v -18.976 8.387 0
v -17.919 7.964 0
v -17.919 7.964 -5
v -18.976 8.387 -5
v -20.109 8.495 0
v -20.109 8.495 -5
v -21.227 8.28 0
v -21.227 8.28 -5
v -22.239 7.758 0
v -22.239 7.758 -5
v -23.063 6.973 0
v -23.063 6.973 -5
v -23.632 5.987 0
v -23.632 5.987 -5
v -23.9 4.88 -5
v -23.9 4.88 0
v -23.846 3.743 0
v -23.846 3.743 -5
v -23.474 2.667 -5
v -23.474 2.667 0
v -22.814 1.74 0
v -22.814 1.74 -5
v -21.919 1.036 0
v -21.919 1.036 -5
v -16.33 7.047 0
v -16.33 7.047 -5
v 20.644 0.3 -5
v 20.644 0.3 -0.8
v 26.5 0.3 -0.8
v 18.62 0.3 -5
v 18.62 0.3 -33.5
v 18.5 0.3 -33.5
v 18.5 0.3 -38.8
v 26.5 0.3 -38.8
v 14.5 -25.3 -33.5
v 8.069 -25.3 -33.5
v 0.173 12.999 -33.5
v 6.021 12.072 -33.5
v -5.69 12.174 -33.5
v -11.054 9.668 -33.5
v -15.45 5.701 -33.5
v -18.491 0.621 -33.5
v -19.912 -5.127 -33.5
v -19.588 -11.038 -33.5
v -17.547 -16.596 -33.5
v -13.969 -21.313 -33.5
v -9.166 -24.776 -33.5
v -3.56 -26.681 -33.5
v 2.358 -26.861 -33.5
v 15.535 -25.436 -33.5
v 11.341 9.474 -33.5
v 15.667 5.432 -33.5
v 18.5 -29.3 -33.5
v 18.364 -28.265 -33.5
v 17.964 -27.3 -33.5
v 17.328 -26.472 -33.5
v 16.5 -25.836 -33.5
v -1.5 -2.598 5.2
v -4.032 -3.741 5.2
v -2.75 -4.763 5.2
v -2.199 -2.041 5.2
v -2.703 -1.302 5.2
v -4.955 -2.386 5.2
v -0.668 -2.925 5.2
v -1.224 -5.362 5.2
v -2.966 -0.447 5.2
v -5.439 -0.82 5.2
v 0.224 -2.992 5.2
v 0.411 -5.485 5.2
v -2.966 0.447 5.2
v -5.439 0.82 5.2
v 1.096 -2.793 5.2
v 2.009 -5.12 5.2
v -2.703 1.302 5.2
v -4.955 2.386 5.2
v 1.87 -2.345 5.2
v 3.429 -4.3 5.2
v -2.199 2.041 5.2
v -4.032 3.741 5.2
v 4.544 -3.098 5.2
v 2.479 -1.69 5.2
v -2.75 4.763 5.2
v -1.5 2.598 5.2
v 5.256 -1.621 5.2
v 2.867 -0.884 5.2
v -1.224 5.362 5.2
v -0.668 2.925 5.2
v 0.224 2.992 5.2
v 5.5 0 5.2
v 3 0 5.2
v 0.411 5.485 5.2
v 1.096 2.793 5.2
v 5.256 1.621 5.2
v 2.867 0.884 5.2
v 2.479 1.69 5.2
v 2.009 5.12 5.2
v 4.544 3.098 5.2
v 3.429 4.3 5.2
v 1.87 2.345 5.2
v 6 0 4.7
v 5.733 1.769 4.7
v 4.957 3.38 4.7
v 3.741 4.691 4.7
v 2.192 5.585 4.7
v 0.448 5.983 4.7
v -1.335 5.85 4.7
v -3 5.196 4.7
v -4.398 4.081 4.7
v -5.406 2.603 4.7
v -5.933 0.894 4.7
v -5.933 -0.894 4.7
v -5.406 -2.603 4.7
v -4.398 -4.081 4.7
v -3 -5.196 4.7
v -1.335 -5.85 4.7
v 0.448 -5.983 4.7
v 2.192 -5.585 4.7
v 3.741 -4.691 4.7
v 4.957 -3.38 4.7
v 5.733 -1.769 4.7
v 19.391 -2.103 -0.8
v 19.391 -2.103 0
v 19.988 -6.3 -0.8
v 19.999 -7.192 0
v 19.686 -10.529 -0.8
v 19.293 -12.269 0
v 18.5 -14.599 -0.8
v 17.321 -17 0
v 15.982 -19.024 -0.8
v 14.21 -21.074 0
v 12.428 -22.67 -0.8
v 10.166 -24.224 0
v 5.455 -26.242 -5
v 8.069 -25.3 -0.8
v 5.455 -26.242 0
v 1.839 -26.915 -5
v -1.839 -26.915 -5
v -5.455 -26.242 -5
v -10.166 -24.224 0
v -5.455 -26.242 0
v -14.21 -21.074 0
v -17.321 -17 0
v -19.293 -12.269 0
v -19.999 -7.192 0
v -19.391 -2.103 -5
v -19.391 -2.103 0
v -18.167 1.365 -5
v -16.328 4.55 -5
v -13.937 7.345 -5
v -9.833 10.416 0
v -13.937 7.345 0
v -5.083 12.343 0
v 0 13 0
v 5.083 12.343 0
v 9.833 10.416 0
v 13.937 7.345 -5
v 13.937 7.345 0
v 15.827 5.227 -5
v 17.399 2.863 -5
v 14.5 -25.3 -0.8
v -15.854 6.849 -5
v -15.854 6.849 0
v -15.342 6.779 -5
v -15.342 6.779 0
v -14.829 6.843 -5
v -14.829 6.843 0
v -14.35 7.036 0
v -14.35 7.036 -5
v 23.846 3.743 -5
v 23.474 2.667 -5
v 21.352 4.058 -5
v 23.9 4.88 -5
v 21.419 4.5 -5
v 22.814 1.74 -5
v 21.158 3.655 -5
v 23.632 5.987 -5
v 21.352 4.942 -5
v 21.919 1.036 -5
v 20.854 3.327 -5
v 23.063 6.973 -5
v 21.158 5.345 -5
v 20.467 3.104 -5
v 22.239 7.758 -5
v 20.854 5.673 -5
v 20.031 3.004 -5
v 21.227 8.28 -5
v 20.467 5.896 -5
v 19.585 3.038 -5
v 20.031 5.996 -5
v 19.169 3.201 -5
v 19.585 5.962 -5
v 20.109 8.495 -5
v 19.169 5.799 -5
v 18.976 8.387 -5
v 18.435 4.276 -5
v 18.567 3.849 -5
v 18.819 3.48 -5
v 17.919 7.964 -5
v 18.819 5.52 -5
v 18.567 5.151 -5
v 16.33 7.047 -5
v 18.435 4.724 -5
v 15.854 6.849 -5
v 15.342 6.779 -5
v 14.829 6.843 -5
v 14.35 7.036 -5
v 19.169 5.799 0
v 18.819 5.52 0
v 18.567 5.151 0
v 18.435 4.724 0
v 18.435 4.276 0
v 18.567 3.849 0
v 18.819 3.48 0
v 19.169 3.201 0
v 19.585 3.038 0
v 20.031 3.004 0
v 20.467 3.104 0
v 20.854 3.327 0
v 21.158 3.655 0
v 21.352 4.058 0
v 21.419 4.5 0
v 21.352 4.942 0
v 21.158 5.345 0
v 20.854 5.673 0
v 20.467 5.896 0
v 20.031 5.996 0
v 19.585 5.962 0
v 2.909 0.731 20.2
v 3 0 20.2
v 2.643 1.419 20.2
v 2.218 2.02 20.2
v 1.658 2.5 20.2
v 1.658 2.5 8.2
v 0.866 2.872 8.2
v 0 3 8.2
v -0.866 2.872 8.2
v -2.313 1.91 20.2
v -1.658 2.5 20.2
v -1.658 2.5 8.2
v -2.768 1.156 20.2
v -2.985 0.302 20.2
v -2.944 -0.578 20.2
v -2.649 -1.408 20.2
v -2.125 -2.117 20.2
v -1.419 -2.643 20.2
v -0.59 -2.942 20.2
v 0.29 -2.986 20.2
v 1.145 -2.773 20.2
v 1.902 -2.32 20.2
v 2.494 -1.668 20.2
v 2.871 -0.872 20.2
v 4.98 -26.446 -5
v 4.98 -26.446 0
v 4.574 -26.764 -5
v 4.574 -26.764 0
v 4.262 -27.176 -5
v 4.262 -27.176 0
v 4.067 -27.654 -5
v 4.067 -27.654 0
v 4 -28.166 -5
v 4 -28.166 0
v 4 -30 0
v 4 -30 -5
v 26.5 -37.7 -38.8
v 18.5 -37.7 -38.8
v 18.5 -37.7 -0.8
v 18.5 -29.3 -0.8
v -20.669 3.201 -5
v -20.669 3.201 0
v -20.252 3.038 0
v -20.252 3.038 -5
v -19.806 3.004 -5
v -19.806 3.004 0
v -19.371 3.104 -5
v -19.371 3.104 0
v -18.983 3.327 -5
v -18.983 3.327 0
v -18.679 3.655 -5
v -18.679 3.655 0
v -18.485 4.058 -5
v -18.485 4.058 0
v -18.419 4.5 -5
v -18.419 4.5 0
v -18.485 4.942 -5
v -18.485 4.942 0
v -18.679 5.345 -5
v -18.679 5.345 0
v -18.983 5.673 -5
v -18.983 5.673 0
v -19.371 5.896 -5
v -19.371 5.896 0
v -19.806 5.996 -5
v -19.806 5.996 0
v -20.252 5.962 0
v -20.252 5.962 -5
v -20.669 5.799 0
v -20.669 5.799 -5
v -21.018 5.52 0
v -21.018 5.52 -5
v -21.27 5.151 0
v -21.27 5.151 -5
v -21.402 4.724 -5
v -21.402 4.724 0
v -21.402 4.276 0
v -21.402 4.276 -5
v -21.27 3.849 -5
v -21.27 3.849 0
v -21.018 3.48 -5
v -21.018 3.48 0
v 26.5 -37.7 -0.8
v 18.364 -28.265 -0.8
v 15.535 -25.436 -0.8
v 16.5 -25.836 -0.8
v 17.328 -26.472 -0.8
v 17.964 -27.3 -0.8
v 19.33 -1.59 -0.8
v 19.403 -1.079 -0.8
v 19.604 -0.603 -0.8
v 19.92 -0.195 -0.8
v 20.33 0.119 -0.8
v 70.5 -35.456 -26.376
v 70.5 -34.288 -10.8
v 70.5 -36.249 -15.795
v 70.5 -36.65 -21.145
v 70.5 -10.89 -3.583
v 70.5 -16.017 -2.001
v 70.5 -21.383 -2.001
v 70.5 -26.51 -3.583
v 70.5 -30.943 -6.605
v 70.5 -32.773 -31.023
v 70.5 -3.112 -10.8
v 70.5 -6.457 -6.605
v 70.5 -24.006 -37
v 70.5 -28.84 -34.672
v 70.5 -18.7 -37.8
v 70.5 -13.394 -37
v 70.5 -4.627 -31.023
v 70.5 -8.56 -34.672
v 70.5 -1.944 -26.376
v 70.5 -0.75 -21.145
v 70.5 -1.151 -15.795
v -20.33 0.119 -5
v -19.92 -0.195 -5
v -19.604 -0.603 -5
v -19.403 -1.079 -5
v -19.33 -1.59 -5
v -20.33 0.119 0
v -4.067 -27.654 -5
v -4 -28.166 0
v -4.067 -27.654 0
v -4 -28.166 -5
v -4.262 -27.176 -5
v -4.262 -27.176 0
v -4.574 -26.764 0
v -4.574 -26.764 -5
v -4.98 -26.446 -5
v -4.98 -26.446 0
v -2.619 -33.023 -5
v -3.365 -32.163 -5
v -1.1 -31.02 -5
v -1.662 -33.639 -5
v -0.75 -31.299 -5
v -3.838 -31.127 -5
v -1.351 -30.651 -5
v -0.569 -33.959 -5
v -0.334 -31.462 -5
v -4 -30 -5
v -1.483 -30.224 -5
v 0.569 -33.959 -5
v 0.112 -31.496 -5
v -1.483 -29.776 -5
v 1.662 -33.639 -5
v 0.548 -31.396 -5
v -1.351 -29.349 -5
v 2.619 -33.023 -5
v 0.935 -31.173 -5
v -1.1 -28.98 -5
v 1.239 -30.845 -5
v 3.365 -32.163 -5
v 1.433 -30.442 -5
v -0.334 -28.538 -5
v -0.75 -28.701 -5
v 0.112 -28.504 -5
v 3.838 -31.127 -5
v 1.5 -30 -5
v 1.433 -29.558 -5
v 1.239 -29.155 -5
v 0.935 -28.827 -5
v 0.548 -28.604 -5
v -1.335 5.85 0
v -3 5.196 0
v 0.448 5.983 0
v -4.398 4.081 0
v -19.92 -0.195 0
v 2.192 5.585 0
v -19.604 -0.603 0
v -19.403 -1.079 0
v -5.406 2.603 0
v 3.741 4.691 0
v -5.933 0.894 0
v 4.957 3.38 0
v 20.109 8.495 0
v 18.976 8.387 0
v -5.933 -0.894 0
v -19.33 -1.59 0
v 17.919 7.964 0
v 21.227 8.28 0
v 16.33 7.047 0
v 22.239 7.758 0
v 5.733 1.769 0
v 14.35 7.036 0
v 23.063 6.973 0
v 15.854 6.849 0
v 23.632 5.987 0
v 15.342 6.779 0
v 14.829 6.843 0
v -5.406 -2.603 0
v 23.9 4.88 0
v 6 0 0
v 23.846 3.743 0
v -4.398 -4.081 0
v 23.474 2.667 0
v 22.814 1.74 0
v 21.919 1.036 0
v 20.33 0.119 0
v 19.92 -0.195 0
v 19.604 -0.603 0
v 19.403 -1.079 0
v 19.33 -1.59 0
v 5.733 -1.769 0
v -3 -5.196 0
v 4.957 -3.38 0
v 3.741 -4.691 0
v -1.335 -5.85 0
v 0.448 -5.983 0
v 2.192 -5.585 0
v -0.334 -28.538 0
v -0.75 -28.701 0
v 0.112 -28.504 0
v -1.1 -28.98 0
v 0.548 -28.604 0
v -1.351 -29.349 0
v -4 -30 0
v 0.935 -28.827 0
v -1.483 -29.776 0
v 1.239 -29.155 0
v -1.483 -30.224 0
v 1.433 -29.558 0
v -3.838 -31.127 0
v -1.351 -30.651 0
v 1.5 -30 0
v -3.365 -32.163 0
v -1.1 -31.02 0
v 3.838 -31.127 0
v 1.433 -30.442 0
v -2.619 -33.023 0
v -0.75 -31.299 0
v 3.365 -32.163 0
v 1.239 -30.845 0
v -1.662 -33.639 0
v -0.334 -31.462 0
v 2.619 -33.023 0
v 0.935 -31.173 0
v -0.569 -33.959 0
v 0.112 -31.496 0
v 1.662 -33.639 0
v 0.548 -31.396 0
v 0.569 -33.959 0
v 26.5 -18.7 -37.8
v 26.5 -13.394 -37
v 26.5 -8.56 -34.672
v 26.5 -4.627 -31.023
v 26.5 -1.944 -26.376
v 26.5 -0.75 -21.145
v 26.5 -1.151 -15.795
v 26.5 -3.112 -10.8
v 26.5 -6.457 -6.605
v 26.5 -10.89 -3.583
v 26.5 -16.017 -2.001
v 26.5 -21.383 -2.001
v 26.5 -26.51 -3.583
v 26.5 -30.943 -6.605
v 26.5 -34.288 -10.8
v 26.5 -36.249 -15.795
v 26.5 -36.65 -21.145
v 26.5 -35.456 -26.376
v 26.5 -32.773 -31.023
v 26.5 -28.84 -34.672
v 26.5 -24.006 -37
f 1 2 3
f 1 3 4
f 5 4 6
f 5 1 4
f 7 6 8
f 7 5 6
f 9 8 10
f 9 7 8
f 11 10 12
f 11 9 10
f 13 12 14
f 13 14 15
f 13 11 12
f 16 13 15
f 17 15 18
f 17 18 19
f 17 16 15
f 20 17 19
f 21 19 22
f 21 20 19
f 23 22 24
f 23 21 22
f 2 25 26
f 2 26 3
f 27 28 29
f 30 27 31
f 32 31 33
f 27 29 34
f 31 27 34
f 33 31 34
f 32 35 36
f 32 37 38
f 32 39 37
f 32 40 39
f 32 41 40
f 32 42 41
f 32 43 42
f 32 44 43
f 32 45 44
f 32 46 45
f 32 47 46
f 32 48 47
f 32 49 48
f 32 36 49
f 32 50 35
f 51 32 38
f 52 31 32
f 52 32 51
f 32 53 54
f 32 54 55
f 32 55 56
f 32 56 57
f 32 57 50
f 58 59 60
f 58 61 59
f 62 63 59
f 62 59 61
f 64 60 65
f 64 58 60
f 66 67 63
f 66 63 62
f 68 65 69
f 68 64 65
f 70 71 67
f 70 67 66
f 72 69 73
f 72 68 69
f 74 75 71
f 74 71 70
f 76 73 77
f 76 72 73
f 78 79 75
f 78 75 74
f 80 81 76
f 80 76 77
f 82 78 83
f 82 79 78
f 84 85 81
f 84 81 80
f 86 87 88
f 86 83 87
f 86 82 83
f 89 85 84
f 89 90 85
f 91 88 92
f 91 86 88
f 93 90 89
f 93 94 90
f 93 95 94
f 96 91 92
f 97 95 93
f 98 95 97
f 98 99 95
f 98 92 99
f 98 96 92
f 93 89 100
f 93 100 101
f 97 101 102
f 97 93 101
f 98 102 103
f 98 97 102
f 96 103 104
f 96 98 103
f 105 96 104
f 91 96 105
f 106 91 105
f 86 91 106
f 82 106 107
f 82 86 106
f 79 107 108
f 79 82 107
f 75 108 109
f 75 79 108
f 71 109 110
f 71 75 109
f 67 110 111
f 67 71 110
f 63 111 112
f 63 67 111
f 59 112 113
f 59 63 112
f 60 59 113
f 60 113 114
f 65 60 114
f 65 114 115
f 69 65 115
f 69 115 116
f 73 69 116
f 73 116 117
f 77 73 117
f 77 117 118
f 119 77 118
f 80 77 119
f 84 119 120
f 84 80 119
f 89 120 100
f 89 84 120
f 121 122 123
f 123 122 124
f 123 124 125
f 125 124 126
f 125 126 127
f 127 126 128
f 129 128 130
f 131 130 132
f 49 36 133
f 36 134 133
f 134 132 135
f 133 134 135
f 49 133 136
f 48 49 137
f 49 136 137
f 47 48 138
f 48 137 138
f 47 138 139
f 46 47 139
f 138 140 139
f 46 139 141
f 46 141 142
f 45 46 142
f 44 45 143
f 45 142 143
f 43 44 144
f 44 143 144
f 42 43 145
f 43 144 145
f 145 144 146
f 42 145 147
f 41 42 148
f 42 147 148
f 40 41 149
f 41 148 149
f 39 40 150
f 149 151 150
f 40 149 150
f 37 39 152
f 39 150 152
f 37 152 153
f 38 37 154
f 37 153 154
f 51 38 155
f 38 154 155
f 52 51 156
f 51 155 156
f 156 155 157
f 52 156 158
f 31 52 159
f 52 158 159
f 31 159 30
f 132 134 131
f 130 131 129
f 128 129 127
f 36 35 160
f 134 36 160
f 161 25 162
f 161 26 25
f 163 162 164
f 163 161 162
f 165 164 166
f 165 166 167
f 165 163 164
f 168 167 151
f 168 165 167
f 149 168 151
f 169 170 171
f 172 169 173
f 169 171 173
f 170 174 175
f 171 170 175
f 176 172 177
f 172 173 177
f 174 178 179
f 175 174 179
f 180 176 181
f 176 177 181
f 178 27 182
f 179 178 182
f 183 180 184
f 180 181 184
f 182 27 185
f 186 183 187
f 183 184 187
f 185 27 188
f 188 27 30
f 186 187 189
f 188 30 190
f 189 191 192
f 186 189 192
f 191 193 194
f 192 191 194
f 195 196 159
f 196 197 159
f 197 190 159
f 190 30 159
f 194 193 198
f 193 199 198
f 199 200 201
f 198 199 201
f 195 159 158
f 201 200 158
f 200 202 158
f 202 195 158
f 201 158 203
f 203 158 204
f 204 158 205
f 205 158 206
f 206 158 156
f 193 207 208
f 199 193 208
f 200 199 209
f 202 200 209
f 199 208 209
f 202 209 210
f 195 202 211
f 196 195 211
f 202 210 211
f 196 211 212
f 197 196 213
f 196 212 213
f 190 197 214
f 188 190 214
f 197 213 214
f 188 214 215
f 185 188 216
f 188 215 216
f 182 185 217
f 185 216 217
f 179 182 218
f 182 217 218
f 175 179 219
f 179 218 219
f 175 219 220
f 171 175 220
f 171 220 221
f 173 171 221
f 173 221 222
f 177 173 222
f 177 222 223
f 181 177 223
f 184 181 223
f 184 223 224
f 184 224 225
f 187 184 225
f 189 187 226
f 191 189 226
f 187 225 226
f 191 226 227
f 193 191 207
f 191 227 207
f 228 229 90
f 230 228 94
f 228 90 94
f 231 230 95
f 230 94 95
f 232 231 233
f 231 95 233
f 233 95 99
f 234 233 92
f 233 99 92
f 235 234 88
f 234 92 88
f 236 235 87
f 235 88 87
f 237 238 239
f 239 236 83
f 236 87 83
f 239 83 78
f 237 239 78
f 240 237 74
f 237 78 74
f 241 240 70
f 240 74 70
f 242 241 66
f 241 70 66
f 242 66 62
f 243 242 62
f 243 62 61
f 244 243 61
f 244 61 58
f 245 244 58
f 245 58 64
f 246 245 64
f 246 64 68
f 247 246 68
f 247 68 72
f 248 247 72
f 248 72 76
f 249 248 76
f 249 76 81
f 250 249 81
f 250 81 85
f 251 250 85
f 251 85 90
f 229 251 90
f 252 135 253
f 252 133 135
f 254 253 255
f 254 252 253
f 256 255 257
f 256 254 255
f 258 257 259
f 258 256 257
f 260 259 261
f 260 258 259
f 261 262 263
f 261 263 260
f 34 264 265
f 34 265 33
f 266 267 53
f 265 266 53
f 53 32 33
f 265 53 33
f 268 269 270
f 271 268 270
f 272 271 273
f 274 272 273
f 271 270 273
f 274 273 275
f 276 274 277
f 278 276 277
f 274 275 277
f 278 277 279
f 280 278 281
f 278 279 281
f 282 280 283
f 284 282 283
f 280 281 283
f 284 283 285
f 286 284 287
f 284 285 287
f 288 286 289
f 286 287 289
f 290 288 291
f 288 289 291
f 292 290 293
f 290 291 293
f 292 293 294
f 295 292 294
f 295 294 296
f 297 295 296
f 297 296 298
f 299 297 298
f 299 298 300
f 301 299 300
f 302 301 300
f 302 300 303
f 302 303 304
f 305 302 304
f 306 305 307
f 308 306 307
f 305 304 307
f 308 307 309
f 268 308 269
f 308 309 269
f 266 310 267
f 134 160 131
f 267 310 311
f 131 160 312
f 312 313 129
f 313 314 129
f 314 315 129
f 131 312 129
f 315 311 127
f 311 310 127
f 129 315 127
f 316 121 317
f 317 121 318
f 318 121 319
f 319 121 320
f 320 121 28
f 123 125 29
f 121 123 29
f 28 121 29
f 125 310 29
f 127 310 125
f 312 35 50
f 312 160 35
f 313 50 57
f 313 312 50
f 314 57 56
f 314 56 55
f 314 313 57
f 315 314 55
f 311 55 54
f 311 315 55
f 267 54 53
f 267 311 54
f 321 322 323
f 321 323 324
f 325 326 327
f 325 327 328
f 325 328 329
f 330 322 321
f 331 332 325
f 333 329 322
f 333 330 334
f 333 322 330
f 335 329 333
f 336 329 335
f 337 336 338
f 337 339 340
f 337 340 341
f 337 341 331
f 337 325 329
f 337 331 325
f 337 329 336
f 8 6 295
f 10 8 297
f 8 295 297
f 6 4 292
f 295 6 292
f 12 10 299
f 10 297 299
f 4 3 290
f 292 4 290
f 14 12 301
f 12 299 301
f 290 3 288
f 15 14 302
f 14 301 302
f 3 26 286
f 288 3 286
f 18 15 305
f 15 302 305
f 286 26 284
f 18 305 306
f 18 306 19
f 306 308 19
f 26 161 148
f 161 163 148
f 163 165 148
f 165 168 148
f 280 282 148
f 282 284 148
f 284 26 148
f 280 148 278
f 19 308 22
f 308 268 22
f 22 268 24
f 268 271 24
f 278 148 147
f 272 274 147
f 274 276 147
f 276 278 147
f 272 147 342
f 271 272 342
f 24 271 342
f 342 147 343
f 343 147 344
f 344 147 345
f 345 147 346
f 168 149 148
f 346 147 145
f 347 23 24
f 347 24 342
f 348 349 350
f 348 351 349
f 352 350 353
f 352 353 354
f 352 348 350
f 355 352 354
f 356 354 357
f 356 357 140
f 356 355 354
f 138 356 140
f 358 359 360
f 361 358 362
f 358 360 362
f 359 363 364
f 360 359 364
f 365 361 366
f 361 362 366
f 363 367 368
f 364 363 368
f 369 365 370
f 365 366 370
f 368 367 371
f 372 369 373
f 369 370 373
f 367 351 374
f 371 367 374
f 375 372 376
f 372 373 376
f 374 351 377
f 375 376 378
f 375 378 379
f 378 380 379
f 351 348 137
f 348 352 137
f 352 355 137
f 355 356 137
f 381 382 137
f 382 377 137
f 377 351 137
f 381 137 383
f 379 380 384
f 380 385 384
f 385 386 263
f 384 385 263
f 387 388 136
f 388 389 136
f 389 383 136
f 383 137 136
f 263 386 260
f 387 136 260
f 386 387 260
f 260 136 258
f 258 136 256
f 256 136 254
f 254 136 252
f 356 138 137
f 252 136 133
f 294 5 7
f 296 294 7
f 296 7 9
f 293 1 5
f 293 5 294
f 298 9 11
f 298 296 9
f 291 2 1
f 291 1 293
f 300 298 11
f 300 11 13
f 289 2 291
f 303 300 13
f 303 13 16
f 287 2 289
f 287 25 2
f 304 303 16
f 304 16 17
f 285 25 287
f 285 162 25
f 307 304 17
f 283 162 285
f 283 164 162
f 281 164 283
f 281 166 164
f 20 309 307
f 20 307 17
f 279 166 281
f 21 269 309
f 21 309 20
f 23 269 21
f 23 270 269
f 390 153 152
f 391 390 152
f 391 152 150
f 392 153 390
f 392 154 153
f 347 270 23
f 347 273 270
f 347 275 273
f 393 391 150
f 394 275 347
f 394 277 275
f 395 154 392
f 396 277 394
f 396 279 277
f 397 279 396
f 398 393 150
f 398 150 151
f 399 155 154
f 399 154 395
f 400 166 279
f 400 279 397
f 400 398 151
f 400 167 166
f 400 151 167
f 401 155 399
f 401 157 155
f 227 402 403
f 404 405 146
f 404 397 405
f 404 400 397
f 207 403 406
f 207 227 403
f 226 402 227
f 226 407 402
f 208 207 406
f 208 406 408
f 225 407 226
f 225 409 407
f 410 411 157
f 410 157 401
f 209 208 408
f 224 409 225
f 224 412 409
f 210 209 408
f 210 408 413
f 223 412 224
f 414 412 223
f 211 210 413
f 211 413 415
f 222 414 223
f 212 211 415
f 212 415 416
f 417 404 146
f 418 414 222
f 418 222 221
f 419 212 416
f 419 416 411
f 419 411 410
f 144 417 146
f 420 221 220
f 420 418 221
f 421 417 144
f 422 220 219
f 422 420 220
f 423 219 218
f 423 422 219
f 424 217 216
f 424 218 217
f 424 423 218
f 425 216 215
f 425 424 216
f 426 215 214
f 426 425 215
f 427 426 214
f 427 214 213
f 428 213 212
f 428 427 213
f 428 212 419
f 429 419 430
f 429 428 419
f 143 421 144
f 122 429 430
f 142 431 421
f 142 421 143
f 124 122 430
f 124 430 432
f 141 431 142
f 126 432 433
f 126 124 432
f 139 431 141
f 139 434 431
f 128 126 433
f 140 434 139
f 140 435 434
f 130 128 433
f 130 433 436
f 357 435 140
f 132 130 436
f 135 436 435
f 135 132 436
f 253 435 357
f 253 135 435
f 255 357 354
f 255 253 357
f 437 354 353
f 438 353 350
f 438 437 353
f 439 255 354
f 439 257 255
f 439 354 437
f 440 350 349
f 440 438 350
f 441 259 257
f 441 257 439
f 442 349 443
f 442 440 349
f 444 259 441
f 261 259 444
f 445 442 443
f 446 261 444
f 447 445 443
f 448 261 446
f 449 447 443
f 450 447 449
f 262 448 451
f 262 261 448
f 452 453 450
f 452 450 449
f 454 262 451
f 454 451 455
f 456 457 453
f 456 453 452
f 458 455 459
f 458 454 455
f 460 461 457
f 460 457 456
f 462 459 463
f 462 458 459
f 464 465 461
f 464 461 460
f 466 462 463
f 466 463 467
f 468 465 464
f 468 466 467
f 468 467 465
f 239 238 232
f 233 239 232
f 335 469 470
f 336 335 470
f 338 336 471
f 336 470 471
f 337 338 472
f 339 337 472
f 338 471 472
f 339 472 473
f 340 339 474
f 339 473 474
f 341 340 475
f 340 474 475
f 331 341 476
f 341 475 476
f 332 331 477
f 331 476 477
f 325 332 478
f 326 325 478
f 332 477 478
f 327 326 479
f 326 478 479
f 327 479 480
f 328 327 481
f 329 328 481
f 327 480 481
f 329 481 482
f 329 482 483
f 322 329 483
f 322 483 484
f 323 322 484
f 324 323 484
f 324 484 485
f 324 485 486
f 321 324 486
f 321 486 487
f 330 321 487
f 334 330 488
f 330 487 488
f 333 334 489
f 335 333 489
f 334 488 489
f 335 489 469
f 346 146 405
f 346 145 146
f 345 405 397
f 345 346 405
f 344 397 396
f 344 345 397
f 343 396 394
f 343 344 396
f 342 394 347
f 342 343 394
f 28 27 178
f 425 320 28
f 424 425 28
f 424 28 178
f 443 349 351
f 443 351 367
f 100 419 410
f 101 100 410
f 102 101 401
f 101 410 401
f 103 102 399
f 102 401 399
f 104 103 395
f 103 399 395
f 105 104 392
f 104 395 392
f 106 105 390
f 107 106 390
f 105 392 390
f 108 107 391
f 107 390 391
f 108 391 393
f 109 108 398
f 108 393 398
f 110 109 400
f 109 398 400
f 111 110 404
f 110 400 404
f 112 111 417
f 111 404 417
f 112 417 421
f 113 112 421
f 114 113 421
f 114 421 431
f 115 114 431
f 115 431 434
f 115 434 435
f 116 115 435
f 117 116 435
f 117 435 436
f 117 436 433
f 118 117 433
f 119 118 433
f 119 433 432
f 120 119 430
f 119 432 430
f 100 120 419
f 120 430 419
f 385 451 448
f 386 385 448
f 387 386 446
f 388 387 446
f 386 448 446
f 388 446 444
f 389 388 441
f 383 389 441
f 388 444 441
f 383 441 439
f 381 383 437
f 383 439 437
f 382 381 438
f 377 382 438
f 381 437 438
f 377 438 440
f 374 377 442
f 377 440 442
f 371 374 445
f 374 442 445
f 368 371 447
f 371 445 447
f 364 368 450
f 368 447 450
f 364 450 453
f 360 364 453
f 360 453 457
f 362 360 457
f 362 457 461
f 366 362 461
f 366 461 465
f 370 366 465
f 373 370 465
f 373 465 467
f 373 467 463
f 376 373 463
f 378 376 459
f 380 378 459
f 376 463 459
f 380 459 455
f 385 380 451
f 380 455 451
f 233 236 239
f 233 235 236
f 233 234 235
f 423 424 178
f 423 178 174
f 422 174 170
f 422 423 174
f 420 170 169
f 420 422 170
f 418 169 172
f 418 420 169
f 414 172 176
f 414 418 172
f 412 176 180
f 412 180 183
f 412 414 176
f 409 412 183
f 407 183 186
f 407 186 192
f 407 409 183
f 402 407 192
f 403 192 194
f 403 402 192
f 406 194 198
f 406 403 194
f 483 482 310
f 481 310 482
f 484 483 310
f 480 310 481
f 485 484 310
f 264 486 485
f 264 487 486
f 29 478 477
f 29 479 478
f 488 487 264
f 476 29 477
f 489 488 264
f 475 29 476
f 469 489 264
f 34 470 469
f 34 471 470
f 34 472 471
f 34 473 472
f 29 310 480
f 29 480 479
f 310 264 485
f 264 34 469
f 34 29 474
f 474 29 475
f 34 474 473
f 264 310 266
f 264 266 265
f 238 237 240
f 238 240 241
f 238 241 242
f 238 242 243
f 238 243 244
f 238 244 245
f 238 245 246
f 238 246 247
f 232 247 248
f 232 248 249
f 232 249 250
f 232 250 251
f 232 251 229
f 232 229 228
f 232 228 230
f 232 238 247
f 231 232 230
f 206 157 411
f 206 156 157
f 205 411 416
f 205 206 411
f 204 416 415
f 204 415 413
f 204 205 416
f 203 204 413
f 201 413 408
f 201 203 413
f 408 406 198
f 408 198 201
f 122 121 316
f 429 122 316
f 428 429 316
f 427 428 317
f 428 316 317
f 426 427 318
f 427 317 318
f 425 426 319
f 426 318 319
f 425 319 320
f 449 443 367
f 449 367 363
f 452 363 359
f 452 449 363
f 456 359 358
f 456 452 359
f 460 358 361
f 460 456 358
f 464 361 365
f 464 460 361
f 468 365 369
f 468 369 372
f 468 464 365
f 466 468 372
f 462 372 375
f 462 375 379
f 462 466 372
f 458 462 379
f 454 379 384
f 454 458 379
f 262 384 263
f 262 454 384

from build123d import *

# Parameters (mm, degrees)
SKETCH_1_R                       = 6
EXTRUDE_1_DEPTH                  = 5.2
CHAMFER_1_SIZE                   = 0.5
SKETCH_2_R                       = 3
EXTRUDE_2_DEPTH                  = 15
SKETCH_3_OUTSIDE_W               = 19.276
SKETCH_3_OUTSIDE_H               = 19.276
CUT_EXTRUDE_1_DEPTH              = 12
SKETCH_4_R                       = 20
EXTRUDE_3_DEPTH                  = 33.5
SKETCH_5_R                       = 1.5
EXTRUDE_4_DEPTH                  = 5
FILLET_2_R                       = 2
PATTERN_CIRCULAR_1_COUNT         = 3
FILLET_2_OF_PATTERN_CIRCULAR_1_R = 2
SKETCH_7_W                       = 38
SKETCH_7_H                       = 38
EXTRUDE_5_DEPTH                  = 8
EXTRUDE_6_REACH                  = 70.746
EXTRUDE_6_END_RADIUS             = 20
SKETCH_8_W                       = 32.7
SKETCH_8_H                       = 10.700657923
SKETCH_10_R                      = 18
EXTRUDE_7_DEPTH                  = 44
FILLET_1_R                       = 4


with BuildPart() as part:
    # ｽｹｯﾁ1 → ﾎﾞｽ - 押し出し1 (new body)
    with BuildSketch(Plane.XY):
        Circle(SKETCH_1_R)
    extrude(amount=EXTRUDE_1_DEPTH)

    # 面取り1
    chamfer_1_edges = [part.edges().sort_by_distance(p)[0] for p in [
        (-6, 0, 5.2),
    ]]
    chamfer(chamfer_1_edges, length=CHAMFER_1_SIZE)

    # ｽｹｯﾁ2 → ﾎﾞｽ - 押し出し2 (add)
    with BuildSketch(Plane.XY.offset(5.2)):
        Circle(SKETCH_2_R)
    extrude(amount=EXTRUDE_2_DEPTH)

    # ｽｹｯﾁ3 outside → ｶｯﾄ - 押し出し1 (cut)
    with BuildSketch(Plane.XY.offset(20.2)):
        Rectangle(SKETCH_3_OUTSIDE_W, SKETCH_3_OUTSIDE_H)
        with BuildLine():
            Line((-1.658312395, 2.5), (1.658312395, 2.5))
            ThreePointArc((1.658312395, 2.5), (0, -3), (-1.658312395, 2.5))
        make_face(mode=Mode.SUBTRACT)
    extrude(amount=-CUT_EXTRUDE_1_DEPTH, mode=Mode.SUBTRACT)

    # ｽｹｯﾁ4 → ﾎﾞｽ - 押し出し3 (add)
    with BuildSketch(Plane(origin=(0, 0, 0), x_dir=(-1, 0, 0), z_dir=(0, 0, -1))):
        with Locations((0, -7)):
            Circle(SKETCH_4_R)
    extrude(amount=EXTRUDE_3_DEPTH)

    # ｽｹｯﾁ5 → ﾎﾞｽ - 押し出し4 (add)
    with BuildSketch(Plane.XY):
        with BuildLine():
            Line((-4, -26.595917942), (-4, -30))
            ThreePointArc((-4, -30), (0, -34), (4, -30))
            Line((4, -30), (4, -26.595917942))
            Line((4, -26.595917942), (-4, -26.595917942))
        make_face()
        with Locations((0, -30)):
            Circle(SKETCH_5_R, mode=Mode.SUBTRACT)
    extrude_4 = extrude(amount=-EXTRUDE_4_DEPTH)

    # ﾌｨﾚｯﾄ2
    fillet_2_edges = [part.edges().sort_by_distance(p)[0] for p in [
        (-4, -26.595917942, -2.5),
        (4, -26.595917942, -2.5),
    ]]
    fillet(fillet_2_edges, radius=FILLET_2_R)

    # 円形ﾊﾟﾀｰﾝ1: ﾎﾞｽ - 押し出し4 ×3 about axis
    pattern_circular_1_axis = Axis((0, -7, 0), (0, 0, 1))
    for i in range(1, PATTERN_CIRCULAR_1_COUNT):
        add(extrude_4.rotate(pattern_circular_1_axis, i * 360 / PATTERN_CIRCULAR_1_COUNT))

    # ﾌｨﾚｯﾄ2 of 円形ﾊﾟﾀｰﾝ1
    fillet_2_of_pattern_circular_1_edges = [part.edges().sort_by_distance(p)[0] for p in [
        (18.970562748, -0.666142644, -2.5),
        (14.970562748, 6.262060586, -2.5),
        (-14.970562748, 6.262060586, -2.5),
        (-18.970562748, -0.666142644, -2.5),
    ]]
    fillet(fillet_2_of_pattern_circular_1_edges, radius=FILLET_2_OF_PATTERN_CIRCULAR_1_R)

    # ｽｹｯﾁ7 → ﾎﾞｽ - 押し出し5 (add)
    with BuildSketch(Plane(origin=(26.5, 0, 0), x_dir=(0, 0, -1), z_dir=(1, 0, 0))):
        with Locations((19.8, -18.7)):
            Rectangle(SKETCH_7_W, SKETCH_7_H)
    extrude(amount=-EXTRUDE_5_DEPTH)

    # ﾎﾞｽ - 押し出し6: up to this cylinder (the profile starts outside it)
    extrude_6_end = Plane(origin=(0, -7, -17.15), z_dir=(0, 0, 1)) * Cylinder(EXTRUDE_6_END_RADIUS, 182.492, mode=Mode.PRIVATE)
    # ｽｹｯﾁ8 → ﾎﾞｽ - 押し出し6 (add, up to the surface)
    with BuildSketch(Plane.ZY.offset(-18.5), mode=Mode.PRIVATE) as extrude_6_sk1:
        with Locations((-17.15, -19.949671039)):
            Rectangle(SKETCH_8_W, SKETCH_8_H)
    extrude_6_tool1 = extrude(extrude_6_sk1.sketch, amount=EXTRUDE_6_REACH, mode=Mode.PRIVATE) - extrude_6_end
    add(extrude_6_tool1.solids().sort_by_distance((18.5, -19.949671, -17.15))[0])

    # ｽｹｯﾁ10 → ﾎﾞｽ - 押し出し7 (add)
    with BuildSketch(Plane(origin=(26.5, 0, 0), x_dir=(0, 0, -1), z_dir=(1, 0, 0))):
        with Locations((19.8, -18.7)):
            Circle(SKETCH_10_R)
    extrude(amount=EXTRUDE_7_DEPTH)

    # ﾌｨﾚｯﾄ1
    fillet_1_edges = [part.edges().sort_by_distance(p)[0] for p in [
        (18.5, -25.3, -17.15),
    ]]
    fillet(fillet_1_edges, radius=FILLET_1_R)


solid = part.part
